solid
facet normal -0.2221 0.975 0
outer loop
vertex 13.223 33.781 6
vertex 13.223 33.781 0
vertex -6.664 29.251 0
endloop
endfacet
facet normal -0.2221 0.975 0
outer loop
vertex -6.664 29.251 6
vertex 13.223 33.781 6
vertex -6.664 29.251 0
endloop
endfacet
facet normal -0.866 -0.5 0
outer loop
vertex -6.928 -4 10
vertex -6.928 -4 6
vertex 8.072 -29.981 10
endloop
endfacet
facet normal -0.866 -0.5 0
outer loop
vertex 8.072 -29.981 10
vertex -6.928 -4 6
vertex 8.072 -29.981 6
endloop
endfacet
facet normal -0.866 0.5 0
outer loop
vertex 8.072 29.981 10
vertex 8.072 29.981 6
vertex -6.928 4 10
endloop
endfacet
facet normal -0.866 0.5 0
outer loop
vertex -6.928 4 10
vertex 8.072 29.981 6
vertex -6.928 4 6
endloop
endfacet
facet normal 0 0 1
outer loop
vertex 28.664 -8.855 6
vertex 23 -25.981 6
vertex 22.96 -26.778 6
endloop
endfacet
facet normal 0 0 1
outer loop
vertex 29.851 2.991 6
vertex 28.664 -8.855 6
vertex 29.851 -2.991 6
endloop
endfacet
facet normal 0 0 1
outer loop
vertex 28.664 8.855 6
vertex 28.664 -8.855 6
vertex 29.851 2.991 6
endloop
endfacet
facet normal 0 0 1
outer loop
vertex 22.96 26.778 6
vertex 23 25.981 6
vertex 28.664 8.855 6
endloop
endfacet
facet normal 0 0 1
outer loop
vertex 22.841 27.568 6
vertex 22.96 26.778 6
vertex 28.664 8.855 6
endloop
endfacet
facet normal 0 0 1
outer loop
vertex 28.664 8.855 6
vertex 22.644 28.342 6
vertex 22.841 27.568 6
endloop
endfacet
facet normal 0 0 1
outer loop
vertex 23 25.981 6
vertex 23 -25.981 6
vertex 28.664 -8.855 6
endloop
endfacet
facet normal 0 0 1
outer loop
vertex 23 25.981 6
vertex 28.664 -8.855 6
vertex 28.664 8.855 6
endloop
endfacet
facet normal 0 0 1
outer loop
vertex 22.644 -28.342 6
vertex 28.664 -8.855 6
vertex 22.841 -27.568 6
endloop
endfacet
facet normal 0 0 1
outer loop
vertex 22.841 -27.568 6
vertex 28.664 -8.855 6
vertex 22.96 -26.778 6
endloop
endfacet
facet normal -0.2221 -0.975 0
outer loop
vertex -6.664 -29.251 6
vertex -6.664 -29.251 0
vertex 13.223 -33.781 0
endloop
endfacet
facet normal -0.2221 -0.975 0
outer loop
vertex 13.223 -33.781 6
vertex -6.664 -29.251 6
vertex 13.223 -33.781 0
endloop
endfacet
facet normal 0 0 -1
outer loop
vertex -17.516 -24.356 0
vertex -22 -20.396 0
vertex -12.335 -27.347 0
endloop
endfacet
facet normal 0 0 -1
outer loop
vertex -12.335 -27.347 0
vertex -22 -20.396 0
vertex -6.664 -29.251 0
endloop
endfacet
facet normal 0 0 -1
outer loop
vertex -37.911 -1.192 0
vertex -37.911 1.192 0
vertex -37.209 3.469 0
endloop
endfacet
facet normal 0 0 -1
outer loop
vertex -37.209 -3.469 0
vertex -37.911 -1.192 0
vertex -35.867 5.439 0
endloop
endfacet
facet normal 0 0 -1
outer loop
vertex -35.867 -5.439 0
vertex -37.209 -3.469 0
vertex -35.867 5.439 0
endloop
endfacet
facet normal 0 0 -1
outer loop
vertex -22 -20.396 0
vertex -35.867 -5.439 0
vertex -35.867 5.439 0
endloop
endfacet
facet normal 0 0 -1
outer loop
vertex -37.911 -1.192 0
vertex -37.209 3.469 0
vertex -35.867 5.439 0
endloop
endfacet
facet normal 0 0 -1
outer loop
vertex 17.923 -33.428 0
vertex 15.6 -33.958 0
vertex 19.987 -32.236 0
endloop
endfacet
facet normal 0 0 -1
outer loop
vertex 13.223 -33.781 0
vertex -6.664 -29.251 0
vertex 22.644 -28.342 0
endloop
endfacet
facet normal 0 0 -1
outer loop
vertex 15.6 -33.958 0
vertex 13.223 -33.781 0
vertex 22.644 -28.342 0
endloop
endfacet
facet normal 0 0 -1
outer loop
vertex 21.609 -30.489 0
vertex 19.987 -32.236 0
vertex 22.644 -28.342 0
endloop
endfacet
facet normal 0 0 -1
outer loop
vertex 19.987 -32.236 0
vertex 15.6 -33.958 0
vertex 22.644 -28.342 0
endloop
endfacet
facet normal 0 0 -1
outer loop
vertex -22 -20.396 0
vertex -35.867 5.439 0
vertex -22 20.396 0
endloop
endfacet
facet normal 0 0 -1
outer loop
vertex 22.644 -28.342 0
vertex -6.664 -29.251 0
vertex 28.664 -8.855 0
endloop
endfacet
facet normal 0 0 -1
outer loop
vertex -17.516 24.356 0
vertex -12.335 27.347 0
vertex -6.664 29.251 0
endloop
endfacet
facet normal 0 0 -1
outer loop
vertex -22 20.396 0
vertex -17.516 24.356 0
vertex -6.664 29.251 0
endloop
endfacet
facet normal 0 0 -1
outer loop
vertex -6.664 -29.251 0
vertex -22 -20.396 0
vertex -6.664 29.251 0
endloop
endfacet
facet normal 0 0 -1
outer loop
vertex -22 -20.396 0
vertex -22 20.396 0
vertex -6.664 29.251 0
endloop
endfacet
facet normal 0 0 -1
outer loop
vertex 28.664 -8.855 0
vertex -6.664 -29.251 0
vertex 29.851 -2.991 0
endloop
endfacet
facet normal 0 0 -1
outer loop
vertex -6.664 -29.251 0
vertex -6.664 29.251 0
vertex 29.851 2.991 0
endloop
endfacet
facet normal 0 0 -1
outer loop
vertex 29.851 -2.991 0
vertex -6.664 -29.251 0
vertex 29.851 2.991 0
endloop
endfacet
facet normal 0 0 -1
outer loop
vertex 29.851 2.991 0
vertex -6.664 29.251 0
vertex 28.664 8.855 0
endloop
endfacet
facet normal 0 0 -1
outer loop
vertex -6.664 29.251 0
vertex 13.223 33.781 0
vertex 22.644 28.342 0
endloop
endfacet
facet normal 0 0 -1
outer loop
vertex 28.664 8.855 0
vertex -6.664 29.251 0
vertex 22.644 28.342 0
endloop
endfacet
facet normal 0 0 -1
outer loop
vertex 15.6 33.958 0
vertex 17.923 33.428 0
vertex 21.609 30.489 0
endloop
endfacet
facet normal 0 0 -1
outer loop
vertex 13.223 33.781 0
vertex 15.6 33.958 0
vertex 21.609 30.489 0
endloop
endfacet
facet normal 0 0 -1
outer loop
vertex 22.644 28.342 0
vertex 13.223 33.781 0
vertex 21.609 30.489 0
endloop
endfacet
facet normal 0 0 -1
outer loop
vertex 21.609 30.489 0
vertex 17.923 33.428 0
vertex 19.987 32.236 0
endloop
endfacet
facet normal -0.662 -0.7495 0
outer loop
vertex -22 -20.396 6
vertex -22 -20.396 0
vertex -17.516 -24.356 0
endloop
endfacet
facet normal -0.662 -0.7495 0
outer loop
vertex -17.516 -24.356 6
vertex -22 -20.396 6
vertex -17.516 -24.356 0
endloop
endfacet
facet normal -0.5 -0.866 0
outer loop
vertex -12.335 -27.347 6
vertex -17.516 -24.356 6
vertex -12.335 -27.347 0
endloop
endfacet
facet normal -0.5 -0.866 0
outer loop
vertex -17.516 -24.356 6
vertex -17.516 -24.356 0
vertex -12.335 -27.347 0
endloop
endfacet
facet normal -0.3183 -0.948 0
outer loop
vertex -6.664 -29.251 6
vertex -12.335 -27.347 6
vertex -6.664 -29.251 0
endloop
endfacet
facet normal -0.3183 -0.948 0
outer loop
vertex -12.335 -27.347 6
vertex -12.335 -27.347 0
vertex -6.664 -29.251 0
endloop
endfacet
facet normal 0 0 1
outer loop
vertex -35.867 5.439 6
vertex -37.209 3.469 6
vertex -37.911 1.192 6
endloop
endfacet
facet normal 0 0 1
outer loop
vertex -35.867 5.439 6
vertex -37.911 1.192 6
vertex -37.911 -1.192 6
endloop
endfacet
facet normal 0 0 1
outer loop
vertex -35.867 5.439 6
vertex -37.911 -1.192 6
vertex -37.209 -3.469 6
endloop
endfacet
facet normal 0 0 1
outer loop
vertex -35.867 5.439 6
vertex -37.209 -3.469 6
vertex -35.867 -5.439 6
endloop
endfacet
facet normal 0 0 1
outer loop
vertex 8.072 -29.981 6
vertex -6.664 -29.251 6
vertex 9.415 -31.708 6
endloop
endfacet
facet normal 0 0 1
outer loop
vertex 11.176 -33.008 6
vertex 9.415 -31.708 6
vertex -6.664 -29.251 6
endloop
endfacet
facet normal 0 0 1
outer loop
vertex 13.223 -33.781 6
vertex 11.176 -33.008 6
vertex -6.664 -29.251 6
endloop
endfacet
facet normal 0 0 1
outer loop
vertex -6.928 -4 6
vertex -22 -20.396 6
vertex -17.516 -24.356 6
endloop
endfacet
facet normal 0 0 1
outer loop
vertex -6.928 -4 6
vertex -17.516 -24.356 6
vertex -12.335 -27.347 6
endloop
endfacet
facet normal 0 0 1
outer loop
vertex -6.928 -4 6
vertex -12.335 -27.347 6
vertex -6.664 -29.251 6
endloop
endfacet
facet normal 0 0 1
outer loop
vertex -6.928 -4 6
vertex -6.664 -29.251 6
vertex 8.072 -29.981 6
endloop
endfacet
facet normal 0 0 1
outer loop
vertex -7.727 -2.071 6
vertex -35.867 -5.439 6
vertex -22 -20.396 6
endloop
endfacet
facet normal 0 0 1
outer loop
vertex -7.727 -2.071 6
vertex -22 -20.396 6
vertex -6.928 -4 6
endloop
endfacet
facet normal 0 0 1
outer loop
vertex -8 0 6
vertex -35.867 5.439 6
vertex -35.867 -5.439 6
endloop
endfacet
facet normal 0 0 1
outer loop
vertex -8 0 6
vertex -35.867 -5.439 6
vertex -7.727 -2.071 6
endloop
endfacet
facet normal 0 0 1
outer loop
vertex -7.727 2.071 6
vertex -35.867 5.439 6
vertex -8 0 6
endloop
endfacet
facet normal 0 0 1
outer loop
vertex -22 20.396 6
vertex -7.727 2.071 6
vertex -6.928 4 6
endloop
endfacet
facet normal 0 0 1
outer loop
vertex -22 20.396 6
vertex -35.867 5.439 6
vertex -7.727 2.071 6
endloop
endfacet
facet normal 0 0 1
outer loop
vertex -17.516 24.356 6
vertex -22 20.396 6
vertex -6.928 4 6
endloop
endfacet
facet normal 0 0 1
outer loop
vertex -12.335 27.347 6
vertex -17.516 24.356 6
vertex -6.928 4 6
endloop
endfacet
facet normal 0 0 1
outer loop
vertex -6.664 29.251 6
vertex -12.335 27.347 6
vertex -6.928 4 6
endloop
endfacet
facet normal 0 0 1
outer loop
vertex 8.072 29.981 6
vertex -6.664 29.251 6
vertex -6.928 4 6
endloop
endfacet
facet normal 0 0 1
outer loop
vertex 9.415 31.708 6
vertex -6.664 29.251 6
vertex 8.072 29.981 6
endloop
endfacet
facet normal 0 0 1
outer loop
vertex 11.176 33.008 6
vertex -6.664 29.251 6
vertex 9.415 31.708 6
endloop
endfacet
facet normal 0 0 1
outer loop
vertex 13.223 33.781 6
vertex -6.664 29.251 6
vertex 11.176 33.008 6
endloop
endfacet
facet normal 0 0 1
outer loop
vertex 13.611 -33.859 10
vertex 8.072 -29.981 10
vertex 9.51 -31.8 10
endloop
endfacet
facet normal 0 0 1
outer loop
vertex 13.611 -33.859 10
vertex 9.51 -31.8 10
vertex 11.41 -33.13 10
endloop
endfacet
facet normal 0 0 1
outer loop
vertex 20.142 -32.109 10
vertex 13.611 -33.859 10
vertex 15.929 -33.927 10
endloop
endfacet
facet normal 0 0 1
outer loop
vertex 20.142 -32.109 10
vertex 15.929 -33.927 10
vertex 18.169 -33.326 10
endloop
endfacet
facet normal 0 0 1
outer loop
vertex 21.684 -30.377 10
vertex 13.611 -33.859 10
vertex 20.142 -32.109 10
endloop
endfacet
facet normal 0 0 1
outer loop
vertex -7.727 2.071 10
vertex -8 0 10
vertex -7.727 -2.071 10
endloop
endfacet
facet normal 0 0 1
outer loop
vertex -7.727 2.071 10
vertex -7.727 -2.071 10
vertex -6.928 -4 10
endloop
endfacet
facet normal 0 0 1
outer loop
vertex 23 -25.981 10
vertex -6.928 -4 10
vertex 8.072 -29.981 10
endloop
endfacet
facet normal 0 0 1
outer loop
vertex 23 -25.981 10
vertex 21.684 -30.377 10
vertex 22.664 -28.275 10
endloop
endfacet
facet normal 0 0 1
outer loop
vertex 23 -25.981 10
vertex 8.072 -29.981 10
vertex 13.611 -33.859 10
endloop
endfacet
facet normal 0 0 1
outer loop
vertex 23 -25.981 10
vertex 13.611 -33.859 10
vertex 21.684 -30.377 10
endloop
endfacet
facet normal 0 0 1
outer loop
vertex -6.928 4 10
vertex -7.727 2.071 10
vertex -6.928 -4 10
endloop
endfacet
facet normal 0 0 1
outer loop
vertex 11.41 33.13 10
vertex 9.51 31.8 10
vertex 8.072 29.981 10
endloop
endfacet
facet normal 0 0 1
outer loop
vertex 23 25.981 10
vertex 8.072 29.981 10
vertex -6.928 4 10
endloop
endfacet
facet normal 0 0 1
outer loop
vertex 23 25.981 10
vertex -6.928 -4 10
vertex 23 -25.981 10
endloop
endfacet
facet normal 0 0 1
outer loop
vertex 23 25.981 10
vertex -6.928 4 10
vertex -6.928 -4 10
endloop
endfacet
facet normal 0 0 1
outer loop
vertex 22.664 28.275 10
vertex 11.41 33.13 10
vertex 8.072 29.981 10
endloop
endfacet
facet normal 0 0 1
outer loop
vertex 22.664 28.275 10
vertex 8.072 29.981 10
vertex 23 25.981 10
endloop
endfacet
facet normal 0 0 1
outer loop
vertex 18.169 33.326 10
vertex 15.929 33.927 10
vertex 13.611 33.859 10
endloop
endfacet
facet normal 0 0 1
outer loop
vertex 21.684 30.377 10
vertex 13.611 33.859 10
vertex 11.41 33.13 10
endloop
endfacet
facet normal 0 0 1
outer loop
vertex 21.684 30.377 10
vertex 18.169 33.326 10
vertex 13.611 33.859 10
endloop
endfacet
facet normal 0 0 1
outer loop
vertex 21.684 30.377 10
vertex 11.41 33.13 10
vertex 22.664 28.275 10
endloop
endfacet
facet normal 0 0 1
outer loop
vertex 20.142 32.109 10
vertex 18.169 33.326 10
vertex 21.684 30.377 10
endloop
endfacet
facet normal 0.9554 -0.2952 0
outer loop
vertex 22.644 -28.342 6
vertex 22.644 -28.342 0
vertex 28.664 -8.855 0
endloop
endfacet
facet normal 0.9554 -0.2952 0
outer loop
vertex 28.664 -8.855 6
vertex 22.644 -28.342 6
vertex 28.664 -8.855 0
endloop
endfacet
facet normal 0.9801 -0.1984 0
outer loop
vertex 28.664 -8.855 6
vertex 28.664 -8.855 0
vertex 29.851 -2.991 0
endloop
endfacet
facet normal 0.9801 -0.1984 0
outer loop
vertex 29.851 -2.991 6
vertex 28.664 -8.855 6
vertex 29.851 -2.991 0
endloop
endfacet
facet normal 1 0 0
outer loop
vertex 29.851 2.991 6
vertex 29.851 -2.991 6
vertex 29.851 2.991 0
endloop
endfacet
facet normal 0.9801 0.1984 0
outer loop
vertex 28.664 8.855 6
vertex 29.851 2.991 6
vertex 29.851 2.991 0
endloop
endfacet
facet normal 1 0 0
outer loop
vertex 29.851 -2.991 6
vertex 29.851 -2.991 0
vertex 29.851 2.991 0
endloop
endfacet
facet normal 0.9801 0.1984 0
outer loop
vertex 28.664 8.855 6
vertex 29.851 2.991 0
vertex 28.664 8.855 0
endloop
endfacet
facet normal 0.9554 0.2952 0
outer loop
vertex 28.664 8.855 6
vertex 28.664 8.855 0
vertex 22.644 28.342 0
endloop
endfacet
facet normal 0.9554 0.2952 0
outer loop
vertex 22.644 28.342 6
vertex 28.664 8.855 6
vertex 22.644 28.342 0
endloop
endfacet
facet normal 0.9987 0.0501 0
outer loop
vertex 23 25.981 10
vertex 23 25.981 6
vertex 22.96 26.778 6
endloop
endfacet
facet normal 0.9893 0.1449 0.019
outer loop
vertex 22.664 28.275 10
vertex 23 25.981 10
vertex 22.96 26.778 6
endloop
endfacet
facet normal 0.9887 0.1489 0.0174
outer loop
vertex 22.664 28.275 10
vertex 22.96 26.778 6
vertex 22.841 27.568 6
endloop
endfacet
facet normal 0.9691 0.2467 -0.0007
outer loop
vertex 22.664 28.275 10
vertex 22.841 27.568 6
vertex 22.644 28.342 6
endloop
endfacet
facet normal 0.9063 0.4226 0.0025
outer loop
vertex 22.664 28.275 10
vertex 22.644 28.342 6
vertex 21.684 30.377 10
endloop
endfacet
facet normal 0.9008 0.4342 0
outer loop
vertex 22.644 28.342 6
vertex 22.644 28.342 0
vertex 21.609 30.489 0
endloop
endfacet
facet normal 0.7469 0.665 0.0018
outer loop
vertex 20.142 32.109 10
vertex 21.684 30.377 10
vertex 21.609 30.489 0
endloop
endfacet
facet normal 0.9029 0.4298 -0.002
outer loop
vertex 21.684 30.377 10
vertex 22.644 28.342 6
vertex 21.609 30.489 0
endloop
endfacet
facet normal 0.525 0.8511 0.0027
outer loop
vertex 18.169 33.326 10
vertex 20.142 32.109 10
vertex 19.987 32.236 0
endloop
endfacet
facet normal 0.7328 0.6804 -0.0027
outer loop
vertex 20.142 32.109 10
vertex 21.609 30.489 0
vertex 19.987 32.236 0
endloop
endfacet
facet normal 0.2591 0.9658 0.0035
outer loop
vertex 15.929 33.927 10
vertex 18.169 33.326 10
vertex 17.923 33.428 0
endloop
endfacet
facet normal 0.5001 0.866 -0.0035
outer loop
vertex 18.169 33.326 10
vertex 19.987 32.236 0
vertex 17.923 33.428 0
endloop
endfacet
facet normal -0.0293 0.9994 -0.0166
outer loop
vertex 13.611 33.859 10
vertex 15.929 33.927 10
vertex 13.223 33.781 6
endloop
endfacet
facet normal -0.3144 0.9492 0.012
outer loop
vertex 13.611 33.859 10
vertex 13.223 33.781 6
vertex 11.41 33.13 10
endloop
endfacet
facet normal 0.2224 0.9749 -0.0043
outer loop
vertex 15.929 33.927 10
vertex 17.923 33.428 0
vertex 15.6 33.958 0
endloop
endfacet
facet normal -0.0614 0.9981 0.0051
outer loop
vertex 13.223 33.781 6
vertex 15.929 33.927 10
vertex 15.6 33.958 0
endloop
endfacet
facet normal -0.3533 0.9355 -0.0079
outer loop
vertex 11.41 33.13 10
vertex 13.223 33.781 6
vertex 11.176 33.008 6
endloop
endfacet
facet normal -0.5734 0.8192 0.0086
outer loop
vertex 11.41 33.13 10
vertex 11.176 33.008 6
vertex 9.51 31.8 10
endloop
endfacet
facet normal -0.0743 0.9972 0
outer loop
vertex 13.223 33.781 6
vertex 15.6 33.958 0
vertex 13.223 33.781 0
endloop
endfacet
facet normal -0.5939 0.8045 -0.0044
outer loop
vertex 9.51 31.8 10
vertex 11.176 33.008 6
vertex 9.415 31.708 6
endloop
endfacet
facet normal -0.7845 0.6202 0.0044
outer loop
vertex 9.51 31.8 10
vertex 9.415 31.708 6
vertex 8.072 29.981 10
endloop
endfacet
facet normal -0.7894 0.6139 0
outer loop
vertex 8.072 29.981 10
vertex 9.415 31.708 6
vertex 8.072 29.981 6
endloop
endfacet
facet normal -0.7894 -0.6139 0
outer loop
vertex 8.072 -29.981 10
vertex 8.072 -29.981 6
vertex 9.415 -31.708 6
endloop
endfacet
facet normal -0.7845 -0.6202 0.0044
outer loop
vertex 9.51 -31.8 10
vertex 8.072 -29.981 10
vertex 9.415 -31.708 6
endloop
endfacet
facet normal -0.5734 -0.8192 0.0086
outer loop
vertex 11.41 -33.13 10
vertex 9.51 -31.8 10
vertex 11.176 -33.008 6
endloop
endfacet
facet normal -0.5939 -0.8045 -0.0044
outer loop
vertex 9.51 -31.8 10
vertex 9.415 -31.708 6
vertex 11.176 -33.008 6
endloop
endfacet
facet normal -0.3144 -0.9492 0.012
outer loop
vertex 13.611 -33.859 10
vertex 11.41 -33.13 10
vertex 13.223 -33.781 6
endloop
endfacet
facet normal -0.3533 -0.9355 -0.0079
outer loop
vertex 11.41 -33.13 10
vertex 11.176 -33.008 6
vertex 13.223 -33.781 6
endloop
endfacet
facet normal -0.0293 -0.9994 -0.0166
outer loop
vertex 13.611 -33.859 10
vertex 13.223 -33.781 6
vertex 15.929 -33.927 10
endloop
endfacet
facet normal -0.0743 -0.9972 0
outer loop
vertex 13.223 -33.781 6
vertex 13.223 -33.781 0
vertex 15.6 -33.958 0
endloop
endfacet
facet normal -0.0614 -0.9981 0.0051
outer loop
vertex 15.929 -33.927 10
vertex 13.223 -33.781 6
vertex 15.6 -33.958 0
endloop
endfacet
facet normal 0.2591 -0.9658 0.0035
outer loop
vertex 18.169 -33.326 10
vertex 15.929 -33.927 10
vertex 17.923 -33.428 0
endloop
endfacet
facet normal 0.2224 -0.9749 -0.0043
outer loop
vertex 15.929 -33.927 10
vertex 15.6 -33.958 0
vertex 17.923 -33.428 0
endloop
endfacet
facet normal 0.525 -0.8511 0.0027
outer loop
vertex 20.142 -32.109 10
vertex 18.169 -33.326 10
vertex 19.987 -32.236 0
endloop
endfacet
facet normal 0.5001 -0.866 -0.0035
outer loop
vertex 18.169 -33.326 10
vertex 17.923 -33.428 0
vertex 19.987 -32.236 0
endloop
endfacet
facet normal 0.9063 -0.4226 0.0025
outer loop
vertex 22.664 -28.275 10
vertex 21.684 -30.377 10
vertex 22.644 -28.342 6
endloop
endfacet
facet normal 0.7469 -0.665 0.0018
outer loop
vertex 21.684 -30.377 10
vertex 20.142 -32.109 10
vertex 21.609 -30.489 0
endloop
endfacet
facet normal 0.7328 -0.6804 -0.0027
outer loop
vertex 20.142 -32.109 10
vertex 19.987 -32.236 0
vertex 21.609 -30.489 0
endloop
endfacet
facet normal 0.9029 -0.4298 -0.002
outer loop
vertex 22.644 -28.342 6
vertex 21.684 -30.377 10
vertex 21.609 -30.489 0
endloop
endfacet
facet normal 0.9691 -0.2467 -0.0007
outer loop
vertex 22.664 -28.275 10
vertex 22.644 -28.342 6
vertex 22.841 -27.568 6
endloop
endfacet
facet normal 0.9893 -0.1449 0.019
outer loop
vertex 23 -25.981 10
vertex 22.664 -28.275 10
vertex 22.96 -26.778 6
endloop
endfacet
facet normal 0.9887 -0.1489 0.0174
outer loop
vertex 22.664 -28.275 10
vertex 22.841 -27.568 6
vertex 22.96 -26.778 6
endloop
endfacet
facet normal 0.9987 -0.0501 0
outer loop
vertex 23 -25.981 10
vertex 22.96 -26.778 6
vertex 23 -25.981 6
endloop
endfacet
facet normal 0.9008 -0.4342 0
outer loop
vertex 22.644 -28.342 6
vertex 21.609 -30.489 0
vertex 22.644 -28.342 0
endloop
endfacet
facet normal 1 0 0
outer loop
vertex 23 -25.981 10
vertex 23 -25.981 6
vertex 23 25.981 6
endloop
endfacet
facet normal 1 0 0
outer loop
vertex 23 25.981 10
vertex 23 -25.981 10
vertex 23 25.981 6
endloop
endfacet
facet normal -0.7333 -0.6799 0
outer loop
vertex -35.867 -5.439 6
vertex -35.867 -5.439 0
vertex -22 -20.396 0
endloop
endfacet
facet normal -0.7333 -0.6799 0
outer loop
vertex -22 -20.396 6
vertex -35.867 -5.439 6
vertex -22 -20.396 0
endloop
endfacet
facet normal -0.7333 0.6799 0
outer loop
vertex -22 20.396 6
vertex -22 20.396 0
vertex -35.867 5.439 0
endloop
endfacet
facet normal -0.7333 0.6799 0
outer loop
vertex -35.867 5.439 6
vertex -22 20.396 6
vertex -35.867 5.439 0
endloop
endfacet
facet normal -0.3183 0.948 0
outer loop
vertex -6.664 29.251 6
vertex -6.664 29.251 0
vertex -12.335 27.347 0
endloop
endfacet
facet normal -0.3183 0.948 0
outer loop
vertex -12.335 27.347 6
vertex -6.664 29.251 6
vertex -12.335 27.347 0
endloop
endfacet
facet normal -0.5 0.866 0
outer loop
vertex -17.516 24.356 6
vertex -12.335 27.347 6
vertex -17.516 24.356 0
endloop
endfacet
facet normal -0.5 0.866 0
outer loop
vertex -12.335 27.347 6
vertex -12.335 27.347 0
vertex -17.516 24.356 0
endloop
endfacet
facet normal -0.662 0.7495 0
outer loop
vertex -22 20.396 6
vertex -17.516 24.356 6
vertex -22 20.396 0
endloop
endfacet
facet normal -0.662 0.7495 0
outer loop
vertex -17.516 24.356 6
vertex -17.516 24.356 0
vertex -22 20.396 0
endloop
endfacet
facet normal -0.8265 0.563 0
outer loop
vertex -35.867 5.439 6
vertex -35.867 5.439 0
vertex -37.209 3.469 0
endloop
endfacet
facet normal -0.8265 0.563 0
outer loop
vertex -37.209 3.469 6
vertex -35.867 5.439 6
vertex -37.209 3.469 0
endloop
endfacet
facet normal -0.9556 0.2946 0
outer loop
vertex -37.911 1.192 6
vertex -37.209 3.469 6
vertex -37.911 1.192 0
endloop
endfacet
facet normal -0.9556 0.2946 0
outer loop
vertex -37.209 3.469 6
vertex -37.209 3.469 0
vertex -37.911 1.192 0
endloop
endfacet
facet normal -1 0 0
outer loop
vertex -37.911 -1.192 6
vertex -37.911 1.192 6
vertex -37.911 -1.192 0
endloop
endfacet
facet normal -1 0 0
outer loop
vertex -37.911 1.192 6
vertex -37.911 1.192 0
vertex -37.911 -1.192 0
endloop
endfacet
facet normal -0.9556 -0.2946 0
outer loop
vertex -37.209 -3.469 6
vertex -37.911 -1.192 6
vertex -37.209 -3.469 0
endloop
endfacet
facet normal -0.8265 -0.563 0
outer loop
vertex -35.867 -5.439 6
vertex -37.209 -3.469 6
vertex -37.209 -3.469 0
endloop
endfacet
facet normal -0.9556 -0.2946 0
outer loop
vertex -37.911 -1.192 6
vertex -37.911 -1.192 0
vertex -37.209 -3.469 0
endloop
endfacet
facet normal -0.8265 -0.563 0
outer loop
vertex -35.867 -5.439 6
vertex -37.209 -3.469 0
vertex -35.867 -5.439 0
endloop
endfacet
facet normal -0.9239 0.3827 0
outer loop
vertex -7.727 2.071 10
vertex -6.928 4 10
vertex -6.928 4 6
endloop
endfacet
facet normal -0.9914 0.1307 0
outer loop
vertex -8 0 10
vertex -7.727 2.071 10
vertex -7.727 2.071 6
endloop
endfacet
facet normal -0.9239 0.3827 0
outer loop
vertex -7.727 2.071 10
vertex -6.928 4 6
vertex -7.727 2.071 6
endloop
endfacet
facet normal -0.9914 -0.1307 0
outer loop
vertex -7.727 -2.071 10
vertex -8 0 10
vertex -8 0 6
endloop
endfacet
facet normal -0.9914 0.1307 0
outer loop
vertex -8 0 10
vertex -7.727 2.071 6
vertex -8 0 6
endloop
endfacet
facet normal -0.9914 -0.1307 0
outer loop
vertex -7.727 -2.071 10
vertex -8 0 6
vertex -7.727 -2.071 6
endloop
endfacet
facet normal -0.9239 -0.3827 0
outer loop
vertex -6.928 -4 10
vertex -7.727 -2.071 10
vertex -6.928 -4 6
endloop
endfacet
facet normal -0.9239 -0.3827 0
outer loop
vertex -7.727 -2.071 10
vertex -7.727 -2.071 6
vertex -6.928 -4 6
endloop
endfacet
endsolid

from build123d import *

# Parameters (mm, degrees)
EXTRUDE_1_DEPTH = 6
EXTRUDE_2_DEPTH = 10


with BuildPart() as part:
    # 草圖1 → 填料-伸長1 (new body)
    with BuildSketch(Plane.XY):
        with BuildLine():
            Line((-22, 20.396078054), (-35.866666667, 5.438954148))
            ThreePointArc((-35.866666667, 5.438954148), (-38, 0), (-35.866666667, -5.438954148))
            Line((-35.866666667, -5.438954148), (-22, -20.396078054))
            ThreePointArc((-22, -20.396078054), (-15, -25.980762114), (-6.663521733, -29.25059791))
            Line((-6.663521733, -29.25059791), (13.223060871, -33.780921556))
            ThreePointArc((13.223060871, -33.780921556), (19, -32.908965344), (22.643605795, -28.341967408))
            Line((22.643605795, -28.341967408), (28.663521733, -8.854519856))
            ThreePointArc((28.663521733, -8.854519856), (30, 0), (28.663521733, 8.854519856))
            Line((28.663521733, 8.854519856), (22.643605795, 28.341967408))
            ThreePointArc((22.643605795, 28.341967408), (19, 32.908965344), (13.223060871, 33.780921556))
            Line((13.223060871, 33.780921556), (-6.663521733, 29.25059791))
            ThreePointArc((-6.663521733, 29.25059791), (-15, 25.980762114), (-22, 20.396078054))
        make_face()
    extrude(amount=EXTRUDE_1_DEPTH)

    # 草圖3 → 填料-伸長2 (add)
    with BuildSketch(Plane.XY):
        with BuildLine():
            Line((8.07179677, 29.980762114), (-6.92820323, 4))
            ThreePointArc((-6.92820323, 4), (-8, 0), (-6.92820323, -4))
            Line((-6.92820323, -4), (8.07179677, -29.980762114))
            ThreePointArc((8.07179677, -29.980762114), (17.070552361, -33.708168724), (23, -25.980762114))
            Line((23, -25.980762114), (23, 25.980762114))
            ThreePointArc((23, 25.980762114), (17.070552361, 33.708168724), (8.07179677, 29.980762114))
        make_face()
    extrude(amount=EXTRUDE_2_DEPTH)


solid = part.part
